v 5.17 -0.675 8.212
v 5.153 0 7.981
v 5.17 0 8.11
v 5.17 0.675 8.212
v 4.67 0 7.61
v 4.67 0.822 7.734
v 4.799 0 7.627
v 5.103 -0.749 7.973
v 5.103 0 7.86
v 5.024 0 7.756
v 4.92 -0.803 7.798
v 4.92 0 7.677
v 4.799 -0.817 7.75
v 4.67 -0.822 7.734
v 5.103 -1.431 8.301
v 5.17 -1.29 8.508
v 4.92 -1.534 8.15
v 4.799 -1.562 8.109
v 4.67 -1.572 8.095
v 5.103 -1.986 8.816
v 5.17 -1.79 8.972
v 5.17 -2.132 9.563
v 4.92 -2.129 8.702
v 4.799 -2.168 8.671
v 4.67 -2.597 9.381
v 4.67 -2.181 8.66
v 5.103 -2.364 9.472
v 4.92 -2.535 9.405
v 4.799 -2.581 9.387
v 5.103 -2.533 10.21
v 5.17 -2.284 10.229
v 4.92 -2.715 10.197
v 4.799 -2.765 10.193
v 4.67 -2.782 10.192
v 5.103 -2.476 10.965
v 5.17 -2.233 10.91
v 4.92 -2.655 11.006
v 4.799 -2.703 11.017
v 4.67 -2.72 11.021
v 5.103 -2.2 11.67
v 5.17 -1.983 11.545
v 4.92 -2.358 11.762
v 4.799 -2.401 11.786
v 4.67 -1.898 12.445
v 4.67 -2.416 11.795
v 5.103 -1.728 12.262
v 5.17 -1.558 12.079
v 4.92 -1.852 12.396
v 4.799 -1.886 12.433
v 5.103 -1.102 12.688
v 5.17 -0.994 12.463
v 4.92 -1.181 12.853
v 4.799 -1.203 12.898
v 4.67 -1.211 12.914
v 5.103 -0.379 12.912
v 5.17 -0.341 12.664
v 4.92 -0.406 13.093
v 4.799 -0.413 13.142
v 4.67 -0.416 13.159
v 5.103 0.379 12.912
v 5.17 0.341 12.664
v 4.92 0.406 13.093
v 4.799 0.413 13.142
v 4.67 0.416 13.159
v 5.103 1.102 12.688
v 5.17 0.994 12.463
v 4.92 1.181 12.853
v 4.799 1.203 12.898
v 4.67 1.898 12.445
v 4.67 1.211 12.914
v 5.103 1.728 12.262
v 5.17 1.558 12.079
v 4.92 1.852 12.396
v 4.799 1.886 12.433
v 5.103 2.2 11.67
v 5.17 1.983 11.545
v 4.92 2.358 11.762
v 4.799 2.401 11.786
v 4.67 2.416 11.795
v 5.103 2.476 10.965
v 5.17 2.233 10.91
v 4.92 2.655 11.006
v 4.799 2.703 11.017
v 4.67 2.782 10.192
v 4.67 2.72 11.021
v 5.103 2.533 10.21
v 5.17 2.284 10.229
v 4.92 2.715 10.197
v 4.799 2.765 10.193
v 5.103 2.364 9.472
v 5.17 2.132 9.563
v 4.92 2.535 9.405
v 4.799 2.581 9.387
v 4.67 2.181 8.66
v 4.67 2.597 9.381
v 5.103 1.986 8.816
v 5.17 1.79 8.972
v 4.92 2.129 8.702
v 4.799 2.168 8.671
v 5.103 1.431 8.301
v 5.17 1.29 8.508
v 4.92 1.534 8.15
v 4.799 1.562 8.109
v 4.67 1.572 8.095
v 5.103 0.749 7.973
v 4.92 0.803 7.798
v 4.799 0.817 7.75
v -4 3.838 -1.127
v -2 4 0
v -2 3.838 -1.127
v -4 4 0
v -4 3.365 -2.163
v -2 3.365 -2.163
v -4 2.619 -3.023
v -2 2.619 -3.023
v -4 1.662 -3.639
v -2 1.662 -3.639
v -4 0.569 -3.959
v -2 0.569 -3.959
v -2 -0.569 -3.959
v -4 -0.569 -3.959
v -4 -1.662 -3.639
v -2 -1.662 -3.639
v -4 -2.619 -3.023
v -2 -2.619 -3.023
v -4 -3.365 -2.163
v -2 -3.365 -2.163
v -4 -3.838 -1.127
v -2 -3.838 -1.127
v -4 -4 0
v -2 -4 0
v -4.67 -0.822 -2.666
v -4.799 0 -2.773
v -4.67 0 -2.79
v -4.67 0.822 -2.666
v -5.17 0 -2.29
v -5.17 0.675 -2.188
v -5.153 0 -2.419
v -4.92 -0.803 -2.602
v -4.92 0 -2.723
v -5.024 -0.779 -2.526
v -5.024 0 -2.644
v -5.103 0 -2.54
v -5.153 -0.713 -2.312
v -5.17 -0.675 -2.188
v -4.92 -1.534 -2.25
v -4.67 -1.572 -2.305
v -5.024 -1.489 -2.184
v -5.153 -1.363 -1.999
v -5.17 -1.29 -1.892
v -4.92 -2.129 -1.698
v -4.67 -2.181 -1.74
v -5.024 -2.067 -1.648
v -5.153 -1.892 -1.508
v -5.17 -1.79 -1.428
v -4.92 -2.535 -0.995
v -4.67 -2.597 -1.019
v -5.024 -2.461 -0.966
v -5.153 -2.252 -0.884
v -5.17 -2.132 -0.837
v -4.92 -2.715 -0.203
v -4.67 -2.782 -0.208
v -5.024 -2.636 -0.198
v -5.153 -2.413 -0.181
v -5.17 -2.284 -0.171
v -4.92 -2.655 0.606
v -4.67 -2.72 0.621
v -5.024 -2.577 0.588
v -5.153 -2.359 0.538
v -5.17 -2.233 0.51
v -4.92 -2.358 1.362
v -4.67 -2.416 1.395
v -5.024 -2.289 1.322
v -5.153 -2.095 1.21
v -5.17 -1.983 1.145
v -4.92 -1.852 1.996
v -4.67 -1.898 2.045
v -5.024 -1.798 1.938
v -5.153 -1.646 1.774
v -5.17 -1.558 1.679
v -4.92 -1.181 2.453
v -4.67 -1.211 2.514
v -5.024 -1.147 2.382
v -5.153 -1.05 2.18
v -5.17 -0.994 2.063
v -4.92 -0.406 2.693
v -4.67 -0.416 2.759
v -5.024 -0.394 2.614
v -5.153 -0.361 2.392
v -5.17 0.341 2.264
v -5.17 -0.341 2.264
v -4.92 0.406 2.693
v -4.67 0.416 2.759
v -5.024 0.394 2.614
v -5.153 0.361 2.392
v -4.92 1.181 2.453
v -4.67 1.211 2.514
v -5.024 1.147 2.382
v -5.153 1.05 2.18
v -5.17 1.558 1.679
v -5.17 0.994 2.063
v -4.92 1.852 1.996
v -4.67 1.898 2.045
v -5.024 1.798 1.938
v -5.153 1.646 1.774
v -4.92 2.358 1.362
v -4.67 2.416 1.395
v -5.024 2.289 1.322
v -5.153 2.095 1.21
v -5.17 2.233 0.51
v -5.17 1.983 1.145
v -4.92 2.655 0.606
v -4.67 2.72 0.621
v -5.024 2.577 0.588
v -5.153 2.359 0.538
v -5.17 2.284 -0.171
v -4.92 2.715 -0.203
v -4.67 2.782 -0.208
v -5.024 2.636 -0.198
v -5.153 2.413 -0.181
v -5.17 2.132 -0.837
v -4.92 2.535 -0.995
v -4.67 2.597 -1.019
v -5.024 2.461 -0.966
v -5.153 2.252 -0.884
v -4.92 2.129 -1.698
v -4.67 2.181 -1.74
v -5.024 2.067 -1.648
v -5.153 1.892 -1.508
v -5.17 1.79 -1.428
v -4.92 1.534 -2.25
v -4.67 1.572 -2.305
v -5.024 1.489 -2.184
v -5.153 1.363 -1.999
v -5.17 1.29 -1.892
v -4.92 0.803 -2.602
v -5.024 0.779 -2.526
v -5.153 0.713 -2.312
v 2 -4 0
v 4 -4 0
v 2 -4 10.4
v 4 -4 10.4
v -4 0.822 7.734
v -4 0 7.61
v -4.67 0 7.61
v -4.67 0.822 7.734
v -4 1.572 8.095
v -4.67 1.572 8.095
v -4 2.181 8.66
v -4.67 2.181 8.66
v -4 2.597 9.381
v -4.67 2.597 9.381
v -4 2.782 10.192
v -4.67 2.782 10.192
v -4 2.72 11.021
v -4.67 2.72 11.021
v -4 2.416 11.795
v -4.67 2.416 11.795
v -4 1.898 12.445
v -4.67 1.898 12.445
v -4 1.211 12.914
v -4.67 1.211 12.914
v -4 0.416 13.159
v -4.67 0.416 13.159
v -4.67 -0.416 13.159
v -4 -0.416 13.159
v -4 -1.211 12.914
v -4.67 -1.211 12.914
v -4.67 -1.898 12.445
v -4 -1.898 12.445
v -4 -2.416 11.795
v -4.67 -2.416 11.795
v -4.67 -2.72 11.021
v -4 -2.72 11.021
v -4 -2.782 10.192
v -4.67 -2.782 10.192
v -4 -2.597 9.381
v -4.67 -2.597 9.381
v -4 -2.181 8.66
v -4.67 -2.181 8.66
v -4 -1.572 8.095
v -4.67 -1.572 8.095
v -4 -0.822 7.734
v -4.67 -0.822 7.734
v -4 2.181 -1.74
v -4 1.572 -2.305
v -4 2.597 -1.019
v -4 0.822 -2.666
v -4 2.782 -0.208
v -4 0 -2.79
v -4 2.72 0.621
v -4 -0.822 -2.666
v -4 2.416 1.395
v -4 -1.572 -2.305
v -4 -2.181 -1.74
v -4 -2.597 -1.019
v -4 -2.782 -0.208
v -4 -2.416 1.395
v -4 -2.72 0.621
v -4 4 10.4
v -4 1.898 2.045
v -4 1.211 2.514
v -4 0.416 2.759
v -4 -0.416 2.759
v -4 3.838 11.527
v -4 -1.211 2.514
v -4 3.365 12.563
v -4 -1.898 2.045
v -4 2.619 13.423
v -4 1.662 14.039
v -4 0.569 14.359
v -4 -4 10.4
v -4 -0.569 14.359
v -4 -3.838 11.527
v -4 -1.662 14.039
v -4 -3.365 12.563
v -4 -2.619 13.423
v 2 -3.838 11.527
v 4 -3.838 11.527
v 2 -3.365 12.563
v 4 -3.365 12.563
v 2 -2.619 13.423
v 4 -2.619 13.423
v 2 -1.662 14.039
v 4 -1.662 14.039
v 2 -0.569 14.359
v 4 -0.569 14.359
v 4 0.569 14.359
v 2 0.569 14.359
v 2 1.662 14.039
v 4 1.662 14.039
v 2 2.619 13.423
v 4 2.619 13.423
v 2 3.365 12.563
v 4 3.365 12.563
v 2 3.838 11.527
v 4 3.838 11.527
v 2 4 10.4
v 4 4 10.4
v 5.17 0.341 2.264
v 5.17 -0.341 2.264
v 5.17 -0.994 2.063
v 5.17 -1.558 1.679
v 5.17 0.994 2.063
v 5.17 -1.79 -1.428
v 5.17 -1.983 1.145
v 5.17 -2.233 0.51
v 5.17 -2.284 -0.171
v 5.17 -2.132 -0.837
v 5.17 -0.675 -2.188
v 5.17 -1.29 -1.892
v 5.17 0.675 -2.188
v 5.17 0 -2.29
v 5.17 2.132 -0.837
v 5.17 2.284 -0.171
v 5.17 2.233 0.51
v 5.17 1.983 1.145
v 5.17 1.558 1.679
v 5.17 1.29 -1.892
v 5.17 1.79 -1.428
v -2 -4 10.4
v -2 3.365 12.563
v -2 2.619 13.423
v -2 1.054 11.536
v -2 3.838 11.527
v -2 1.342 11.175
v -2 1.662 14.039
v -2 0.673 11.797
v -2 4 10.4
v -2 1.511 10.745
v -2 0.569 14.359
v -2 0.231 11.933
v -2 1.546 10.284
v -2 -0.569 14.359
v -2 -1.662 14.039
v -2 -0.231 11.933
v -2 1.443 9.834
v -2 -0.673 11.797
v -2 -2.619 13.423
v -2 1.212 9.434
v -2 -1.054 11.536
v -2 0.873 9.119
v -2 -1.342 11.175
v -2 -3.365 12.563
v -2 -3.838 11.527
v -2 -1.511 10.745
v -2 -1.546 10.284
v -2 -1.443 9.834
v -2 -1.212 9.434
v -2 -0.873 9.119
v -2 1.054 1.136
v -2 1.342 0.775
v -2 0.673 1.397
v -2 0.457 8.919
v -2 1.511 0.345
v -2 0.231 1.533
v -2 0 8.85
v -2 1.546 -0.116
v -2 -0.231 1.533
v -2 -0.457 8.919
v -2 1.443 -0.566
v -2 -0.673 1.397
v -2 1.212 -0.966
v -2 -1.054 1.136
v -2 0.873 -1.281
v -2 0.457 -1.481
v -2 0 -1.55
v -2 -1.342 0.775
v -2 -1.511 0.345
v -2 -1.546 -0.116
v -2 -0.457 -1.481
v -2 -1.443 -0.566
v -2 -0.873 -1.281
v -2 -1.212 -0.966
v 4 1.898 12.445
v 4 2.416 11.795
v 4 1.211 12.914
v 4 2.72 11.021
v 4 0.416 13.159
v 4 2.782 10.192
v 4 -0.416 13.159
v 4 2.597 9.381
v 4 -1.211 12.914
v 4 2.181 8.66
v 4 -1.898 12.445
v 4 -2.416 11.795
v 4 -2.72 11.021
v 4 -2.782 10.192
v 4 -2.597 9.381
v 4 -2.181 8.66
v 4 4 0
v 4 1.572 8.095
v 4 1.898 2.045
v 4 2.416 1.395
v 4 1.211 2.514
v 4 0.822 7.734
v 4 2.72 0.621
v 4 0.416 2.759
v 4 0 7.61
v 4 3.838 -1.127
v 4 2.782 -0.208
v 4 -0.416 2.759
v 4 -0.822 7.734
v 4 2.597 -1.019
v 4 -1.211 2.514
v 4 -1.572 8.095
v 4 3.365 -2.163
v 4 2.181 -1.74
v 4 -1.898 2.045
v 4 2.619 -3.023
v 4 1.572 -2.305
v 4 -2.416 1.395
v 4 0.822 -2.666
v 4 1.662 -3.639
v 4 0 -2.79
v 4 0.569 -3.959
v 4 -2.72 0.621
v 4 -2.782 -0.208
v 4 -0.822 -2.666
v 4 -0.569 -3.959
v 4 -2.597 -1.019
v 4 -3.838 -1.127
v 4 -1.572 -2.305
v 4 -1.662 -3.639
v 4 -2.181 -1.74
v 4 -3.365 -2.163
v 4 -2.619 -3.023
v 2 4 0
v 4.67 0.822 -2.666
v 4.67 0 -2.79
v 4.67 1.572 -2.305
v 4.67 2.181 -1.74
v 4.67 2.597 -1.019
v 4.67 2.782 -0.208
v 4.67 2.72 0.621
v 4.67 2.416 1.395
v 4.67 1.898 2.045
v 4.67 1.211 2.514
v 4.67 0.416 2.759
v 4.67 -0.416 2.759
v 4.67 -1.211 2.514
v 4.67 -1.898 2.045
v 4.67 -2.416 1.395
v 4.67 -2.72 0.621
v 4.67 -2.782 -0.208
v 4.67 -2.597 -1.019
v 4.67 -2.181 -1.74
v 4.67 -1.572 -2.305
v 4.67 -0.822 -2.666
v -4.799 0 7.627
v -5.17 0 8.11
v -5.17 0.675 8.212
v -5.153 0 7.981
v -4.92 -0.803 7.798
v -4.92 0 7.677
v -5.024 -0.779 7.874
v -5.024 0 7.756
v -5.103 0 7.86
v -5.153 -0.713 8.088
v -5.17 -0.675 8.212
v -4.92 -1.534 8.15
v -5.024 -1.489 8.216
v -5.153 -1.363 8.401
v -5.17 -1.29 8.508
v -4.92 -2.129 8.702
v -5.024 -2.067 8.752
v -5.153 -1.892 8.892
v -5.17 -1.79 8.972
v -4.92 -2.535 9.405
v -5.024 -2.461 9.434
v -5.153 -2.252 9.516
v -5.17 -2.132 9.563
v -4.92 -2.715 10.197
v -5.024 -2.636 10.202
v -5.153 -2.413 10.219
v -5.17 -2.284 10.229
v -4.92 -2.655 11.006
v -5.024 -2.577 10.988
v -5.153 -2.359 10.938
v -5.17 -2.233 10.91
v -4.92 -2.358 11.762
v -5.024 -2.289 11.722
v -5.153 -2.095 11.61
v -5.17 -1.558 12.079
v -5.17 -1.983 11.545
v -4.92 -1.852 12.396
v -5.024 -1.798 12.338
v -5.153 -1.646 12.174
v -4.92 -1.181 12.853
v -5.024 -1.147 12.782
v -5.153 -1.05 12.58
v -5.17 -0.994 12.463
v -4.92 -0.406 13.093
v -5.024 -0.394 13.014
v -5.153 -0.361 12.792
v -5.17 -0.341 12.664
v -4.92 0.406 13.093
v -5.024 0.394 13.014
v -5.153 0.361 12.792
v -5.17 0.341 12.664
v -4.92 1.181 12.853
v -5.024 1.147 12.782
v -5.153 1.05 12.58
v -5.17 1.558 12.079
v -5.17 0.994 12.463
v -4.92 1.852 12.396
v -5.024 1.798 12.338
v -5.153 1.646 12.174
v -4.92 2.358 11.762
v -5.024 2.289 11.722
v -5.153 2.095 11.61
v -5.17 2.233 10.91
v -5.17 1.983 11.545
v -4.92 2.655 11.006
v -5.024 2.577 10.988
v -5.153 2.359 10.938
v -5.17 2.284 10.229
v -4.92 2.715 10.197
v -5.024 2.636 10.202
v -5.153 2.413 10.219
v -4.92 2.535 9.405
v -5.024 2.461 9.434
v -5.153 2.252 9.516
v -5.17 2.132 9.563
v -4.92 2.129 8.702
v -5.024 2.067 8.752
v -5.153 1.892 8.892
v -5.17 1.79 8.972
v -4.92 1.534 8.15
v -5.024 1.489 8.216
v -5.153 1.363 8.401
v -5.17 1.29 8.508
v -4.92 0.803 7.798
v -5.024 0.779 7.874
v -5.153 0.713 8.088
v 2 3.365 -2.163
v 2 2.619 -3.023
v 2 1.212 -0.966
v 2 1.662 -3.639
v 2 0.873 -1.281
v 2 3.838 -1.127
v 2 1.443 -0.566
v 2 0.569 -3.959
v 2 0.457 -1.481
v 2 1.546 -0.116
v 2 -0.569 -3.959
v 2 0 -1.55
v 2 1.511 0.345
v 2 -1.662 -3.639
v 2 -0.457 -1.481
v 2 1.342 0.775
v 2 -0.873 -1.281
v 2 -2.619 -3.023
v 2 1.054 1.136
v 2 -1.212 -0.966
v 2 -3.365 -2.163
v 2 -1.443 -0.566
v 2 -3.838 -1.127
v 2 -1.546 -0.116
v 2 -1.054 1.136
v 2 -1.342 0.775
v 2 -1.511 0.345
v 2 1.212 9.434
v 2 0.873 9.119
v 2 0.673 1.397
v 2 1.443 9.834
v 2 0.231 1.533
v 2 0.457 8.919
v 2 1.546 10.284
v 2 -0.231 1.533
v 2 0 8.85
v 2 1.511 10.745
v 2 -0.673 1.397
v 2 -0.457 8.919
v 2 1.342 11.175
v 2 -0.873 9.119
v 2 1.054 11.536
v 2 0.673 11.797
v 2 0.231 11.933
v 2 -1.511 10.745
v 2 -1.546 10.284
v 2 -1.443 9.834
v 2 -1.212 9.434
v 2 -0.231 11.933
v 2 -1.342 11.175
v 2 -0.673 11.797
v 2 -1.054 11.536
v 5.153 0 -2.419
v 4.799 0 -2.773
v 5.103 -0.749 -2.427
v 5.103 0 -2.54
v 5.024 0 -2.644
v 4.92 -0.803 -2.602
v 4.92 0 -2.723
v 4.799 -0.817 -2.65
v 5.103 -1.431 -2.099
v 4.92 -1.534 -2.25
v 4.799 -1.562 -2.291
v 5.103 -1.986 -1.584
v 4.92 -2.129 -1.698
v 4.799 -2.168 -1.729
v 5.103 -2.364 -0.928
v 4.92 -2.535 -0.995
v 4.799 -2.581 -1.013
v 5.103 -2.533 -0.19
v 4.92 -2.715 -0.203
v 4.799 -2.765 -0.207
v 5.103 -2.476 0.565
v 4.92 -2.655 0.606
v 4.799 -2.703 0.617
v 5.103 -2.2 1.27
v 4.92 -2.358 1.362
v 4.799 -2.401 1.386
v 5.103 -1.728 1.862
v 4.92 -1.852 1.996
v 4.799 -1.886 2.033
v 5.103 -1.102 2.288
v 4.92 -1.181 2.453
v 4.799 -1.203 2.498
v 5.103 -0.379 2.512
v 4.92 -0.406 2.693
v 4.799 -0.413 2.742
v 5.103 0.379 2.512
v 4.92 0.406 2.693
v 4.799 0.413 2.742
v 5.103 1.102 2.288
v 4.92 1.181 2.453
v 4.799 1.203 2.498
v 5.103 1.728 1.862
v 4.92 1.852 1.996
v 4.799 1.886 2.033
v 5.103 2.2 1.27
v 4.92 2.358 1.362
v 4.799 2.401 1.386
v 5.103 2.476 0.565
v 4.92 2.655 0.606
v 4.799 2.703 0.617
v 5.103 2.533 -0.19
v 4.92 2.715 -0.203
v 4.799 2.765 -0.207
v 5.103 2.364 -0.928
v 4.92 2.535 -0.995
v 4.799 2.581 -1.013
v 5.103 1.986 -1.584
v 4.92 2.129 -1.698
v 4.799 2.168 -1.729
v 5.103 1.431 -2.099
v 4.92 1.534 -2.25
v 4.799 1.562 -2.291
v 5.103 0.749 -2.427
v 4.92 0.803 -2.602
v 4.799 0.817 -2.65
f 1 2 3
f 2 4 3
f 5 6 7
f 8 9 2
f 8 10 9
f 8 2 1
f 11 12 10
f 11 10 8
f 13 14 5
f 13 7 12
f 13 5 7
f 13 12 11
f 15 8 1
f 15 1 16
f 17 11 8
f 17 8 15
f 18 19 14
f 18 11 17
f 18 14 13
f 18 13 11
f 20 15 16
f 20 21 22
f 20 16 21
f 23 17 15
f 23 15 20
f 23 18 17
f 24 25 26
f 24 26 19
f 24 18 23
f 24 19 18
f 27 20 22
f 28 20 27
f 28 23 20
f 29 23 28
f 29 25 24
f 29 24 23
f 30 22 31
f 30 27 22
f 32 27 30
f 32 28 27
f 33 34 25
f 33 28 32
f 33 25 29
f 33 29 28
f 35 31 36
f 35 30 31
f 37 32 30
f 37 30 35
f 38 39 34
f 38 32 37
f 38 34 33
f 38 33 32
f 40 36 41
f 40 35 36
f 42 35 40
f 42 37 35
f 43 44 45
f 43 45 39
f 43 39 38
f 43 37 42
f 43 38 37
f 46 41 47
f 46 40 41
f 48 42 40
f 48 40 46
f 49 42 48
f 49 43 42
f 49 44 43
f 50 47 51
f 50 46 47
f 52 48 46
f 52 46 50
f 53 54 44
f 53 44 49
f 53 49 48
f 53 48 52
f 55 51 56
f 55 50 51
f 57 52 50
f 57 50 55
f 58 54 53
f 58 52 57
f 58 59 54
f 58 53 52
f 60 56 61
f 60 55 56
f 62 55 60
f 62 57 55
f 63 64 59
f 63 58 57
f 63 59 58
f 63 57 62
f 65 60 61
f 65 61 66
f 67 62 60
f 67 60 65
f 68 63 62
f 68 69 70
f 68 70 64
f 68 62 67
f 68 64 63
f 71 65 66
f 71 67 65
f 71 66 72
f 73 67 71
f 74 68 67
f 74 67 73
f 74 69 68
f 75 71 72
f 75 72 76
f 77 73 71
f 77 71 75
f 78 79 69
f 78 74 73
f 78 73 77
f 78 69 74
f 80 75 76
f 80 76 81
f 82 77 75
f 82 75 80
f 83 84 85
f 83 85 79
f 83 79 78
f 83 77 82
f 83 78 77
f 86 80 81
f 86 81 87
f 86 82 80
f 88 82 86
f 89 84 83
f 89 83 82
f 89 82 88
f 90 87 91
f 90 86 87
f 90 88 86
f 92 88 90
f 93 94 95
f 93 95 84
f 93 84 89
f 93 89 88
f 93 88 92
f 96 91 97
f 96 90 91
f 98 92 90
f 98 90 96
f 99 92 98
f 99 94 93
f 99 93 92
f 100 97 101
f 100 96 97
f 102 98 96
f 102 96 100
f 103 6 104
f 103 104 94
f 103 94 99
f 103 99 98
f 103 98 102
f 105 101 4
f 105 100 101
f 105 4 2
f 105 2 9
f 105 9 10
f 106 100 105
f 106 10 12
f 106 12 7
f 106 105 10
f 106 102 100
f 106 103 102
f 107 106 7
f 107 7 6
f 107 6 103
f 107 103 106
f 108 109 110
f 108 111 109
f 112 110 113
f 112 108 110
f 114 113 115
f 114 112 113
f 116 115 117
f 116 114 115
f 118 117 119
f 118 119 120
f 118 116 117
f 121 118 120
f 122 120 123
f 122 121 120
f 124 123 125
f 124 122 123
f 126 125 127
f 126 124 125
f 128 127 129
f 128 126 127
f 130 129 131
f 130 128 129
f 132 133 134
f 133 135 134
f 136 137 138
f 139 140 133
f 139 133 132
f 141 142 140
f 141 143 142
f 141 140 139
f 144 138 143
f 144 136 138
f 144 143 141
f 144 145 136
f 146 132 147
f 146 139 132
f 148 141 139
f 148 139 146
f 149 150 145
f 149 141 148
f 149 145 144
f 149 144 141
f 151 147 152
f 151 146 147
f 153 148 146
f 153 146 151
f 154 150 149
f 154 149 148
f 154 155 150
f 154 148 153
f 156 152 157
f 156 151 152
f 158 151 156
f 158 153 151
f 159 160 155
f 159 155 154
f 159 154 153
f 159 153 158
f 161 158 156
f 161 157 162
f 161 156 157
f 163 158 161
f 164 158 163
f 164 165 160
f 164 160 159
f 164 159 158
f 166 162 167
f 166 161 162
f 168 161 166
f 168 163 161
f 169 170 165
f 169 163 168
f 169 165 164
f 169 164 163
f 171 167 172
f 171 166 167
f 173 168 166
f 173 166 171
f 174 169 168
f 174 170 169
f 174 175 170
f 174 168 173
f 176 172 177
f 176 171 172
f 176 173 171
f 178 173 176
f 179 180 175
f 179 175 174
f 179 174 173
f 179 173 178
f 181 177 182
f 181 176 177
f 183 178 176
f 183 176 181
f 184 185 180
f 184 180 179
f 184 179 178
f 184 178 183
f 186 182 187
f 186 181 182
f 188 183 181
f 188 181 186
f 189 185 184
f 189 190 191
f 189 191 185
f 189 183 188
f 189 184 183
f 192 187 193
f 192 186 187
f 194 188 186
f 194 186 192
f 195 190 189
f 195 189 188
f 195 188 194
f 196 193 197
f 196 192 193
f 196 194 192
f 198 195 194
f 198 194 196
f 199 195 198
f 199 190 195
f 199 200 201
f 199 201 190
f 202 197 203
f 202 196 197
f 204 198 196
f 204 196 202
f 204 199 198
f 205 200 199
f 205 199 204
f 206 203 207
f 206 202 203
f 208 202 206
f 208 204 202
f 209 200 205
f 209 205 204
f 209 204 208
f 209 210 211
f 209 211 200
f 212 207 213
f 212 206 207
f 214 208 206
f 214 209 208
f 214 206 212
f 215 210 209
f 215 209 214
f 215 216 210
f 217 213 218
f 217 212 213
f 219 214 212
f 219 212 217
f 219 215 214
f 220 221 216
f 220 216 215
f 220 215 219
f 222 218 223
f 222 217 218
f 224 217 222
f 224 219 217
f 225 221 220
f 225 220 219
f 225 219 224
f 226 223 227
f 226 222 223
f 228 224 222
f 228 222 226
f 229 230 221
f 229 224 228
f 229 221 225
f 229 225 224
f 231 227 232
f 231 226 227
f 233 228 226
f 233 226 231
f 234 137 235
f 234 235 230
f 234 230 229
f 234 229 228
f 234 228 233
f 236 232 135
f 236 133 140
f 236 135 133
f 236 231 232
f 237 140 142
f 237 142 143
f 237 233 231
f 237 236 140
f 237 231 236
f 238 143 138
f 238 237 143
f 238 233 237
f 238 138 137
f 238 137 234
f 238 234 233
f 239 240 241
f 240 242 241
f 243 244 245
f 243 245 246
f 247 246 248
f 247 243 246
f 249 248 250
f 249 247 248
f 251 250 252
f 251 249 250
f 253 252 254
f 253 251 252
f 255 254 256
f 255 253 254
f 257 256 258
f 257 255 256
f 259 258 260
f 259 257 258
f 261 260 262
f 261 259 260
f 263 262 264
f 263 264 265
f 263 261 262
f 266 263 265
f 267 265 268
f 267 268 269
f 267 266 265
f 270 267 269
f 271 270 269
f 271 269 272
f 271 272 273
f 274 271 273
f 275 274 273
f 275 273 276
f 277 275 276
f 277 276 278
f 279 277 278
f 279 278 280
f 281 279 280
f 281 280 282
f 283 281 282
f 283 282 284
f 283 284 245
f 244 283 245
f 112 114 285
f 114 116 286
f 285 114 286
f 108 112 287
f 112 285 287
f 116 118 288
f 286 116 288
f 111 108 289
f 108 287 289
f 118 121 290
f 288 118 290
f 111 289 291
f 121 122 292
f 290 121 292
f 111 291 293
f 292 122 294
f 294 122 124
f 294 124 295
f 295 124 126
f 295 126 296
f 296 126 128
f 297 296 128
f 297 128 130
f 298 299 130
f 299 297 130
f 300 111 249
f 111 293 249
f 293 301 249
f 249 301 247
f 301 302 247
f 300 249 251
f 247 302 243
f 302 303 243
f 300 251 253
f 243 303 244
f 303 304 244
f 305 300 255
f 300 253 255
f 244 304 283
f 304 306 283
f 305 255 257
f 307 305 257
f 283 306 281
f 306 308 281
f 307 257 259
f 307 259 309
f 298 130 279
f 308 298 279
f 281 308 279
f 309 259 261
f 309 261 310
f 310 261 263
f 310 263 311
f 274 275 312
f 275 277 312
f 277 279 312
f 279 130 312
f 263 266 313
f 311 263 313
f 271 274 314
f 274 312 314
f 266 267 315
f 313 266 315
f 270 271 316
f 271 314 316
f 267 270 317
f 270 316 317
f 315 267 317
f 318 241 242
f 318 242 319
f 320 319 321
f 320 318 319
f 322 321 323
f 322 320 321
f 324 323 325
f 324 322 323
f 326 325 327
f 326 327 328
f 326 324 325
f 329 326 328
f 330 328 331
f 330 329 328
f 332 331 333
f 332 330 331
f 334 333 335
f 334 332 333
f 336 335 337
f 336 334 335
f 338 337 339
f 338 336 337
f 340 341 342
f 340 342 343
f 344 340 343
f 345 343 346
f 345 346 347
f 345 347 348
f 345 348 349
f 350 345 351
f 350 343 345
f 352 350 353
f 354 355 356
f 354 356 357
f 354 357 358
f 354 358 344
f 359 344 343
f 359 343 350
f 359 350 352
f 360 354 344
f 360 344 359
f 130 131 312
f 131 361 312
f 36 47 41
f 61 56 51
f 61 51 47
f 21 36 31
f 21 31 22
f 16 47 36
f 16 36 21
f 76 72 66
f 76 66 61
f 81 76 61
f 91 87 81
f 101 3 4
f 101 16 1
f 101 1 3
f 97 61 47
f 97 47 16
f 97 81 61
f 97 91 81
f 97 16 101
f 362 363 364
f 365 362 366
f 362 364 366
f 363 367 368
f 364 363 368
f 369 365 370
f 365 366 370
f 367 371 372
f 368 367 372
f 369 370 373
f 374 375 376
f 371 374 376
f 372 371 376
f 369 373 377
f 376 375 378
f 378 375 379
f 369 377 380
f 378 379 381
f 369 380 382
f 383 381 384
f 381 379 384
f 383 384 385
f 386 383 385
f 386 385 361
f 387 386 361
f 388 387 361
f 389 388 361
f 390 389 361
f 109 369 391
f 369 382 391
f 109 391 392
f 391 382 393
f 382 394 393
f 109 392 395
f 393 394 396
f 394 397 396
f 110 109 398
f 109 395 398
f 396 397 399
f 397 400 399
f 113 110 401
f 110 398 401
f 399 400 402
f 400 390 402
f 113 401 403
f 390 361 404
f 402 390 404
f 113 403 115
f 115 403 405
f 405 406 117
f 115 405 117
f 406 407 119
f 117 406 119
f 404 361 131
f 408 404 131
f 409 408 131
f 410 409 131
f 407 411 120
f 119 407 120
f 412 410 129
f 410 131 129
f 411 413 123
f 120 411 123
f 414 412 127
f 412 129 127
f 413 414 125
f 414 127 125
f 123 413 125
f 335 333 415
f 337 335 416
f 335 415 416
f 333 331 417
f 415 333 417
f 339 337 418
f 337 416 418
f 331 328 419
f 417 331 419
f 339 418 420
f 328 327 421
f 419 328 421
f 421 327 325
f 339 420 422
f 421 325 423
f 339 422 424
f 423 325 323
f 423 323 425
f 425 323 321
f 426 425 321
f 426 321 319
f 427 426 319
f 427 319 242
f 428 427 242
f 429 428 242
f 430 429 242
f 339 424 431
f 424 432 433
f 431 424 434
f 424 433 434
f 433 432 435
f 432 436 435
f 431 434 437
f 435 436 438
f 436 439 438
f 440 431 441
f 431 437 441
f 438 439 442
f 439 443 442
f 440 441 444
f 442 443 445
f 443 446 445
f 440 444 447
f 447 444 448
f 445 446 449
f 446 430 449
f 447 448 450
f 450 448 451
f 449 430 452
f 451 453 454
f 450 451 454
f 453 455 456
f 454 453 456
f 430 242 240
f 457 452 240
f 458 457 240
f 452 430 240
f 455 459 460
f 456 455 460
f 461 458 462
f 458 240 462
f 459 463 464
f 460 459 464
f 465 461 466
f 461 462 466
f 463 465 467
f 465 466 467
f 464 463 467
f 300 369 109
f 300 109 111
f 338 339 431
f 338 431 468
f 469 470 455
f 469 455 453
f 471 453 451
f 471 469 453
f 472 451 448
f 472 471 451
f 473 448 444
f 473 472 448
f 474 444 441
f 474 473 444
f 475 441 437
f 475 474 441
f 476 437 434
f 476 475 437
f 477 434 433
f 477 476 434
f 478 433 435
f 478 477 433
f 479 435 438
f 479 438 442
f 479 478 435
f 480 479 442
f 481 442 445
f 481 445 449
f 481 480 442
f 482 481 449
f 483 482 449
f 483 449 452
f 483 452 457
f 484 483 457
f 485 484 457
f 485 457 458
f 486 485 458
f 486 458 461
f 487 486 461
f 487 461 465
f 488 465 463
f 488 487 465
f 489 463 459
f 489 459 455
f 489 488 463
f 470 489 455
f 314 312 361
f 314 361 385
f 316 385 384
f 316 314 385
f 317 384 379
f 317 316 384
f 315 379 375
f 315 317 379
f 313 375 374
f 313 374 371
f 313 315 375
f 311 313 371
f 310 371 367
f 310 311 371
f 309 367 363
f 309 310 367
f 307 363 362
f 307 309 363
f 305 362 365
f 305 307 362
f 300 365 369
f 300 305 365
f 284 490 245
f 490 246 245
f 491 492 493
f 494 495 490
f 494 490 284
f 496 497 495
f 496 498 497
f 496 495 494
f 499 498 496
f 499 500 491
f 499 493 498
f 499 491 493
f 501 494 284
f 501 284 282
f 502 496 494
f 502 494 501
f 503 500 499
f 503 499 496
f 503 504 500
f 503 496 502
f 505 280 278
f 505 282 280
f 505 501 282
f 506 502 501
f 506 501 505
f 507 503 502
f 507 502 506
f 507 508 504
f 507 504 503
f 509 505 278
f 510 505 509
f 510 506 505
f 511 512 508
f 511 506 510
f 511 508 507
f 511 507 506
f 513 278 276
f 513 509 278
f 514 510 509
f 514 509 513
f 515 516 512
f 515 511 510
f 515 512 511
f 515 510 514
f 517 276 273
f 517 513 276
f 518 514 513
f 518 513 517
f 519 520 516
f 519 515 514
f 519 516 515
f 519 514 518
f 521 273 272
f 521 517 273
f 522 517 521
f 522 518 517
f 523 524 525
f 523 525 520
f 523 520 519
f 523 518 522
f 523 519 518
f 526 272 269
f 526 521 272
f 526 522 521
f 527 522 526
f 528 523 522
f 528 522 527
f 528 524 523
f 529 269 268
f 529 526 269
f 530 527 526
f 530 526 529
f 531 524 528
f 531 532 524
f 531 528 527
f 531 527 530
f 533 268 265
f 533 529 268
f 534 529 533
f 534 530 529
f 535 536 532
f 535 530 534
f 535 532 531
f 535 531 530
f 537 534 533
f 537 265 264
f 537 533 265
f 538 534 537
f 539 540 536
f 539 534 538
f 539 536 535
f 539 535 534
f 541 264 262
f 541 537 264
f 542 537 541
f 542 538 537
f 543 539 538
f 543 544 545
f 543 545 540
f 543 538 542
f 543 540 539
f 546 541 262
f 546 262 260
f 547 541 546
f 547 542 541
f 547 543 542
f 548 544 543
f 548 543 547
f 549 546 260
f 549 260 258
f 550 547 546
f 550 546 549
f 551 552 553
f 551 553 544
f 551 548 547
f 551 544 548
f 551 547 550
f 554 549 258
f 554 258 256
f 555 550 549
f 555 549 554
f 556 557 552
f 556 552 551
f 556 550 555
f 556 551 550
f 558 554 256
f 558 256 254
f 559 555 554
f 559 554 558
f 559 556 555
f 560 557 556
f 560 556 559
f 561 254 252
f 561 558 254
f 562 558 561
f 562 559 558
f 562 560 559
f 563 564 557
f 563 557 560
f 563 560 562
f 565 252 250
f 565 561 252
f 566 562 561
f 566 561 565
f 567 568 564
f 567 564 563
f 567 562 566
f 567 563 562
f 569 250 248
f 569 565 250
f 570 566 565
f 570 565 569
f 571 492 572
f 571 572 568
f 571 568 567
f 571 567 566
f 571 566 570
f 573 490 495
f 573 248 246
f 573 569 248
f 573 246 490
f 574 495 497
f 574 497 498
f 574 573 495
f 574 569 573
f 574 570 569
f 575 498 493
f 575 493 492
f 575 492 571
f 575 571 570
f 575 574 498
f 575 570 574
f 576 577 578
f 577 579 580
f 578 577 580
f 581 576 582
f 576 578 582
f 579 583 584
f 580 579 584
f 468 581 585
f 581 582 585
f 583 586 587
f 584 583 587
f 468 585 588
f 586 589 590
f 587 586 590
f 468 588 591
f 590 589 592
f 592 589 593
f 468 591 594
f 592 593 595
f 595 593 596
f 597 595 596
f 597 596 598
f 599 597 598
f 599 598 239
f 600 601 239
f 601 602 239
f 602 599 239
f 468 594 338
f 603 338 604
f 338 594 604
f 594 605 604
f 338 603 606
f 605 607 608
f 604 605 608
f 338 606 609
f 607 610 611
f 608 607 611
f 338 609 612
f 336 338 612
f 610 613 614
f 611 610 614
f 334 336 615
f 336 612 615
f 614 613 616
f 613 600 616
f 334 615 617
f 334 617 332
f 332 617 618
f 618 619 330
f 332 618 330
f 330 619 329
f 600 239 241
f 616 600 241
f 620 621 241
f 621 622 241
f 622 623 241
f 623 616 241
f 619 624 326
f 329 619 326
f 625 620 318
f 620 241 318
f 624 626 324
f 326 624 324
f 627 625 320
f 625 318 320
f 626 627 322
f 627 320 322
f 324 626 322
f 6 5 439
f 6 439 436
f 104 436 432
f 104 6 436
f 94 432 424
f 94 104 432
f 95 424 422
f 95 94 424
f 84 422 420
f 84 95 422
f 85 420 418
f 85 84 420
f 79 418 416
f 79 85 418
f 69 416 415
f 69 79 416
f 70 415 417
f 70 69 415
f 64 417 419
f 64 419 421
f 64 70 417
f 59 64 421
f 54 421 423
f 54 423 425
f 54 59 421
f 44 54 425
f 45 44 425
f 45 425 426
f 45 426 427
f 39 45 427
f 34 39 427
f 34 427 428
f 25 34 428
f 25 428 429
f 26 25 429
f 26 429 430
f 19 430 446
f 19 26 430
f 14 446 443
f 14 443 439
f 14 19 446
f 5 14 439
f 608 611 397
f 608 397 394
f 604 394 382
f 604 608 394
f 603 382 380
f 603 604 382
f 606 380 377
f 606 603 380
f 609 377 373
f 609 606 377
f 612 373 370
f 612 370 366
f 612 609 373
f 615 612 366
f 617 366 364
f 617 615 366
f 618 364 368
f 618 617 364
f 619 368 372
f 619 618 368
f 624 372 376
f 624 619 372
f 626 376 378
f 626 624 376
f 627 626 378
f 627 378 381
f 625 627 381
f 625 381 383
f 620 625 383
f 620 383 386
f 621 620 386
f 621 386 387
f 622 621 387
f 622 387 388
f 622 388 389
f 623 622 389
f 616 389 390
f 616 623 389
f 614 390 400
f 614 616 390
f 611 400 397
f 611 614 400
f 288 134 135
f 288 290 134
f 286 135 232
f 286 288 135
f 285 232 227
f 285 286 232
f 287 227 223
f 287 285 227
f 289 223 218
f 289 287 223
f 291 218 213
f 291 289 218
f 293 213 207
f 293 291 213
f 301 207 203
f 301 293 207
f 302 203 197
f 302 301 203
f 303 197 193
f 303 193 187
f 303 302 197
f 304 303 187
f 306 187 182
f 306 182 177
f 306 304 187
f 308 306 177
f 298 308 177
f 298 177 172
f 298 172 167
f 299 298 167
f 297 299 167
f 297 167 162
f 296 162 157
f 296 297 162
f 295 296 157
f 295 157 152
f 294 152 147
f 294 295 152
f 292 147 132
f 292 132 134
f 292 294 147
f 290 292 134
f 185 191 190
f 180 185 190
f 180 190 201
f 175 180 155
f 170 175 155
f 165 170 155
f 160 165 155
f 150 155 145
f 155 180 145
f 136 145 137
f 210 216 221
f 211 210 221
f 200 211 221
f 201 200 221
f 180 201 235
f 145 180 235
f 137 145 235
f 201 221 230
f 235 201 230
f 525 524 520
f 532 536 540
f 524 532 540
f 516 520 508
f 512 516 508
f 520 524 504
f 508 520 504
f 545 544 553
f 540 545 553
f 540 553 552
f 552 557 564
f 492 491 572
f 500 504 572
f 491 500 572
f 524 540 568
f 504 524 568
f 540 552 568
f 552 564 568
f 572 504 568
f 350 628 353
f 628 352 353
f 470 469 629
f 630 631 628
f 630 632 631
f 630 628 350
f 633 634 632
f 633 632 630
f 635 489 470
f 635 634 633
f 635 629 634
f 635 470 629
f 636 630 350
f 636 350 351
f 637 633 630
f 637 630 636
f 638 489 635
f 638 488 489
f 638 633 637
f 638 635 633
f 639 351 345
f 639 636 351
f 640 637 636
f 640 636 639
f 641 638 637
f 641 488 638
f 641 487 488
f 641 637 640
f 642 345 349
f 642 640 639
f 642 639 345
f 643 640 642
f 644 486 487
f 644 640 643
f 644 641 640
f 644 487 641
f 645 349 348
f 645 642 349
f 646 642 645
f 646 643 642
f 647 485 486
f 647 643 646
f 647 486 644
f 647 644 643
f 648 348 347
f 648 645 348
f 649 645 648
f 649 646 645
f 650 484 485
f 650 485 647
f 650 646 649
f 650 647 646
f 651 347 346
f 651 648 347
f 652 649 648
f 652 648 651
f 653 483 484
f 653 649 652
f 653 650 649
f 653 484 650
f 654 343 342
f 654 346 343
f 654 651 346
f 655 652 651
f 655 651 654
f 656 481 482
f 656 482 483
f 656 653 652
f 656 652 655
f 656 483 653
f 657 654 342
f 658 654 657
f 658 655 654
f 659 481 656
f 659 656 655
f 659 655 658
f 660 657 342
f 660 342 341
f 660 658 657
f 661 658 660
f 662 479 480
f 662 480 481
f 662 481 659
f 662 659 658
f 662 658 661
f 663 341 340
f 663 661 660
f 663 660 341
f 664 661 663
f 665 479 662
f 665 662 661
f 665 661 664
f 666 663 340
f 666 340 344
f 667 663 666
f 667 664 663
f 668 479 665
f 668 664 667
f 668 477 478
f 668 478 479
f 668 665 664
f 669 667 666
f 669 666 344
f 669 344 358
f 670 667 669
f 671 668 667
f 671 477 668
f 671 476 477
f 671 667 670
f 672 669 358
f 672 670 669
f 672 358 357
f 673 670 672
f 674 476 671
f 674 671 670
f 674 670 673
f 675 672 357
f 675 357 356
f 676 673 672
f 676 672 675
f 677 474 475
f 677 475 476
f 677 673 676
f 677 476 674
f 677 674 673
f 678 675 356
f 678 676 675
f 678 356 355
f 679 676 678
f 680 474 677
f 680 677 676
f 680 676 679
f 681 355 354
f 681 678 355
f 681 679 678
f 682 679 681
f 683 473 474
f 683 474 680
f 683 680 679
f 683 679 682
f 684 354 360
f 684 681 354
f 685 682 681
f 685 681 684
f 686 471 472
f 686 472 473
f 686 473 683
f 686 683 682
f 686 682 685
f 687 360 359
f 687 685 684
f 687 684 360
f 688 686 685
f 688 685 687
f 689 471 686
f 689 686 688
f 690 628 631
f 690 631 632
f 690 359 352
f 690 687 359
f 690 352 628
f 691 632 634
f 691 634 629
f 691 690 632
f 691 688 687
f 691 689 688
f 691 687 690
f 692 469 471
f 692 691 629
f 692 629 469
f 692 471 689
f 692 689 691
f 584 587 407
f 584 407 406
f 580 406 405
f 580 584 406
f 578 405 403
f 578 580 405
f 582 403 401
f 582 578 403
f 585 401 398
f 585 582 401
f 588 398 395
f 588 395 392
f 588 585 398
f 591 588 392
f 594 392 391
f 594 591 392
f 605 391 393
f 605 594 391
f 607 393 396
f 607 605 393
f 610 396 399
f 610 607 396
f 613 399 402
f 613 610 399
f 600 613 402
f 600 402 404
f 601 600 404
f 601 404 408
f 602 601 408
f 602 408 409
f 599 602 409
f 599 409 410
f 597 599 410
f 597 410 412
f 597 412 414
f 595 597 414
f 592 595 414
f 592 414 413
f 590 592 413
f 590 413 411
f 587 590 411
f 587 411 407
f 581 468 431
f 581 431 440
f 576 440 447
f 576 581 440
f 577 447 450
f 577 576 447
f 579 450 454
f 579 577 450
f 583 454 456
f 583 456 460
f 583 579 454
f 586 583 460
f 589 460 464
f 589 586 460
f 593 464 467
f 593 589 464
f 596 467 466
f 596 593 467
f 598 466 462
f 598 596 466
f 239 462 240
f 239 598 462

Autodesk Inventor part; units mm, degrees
sketch "Skizze_1" plane through (0, 0, 0) normal (0, 1, 0) x (-1, 0, 0)
  line L0 (4, 14.4) -> (2, 14.4)
  line L1 (2, 14.4) -> (2, -4)
  line L2 (2, -4) -> (4, -4)
  line L3 (4, -4) -> (4, 14.4)
extrude "Extrusion1" add sketch "Skizze_1" along normal mid plane 8
sketch "Skizze_2" plane through (0, 0, 0) normal (0, 1, 0) x (-1, 0, 0)
  line L0 (-5.17, 0) -> (0, 0)
  line L1 (5.17, 0) -> (5.17, -2.29)
  arc A0 (4.67, -2.79) -> (5.17, -2.29) centre (4.67, -2.29) ccw
  line L2 (4.67, -2.79) -> (4, -2.79)
  line L3 (4, -2.79) -> (4, -1.55)
  line L4 (4, -1.55) -> (-4, -1.55)
  line L5 (-4, -1.55) -> (-4, -2.79)
  line L6 (-4, -2.79) -> (-4.67, -2.79)
  arc A1 (-5.17, -2.29) -> (-4.67, -2.79) centre (-4.67, -2.29) ccw
  line L7 (-5.17, -2.29) -> (-5.17, 0)
  line L8 (-5.17, 0) -> (5.17, 0)
revolve "Revolution1" add sketch "Skizze_2" angle 360 about axis through (5.17, 0, 0) along (1, 0, 0)
sketch "Skizze_3" plane through (0, 0, 0) normal (0, 1, 0) x (-1, 0, 0)
  line L0 (-5.17, 10.4) -> (0, 10.4)
  line L1 (5.17, 10.4) -> (5.17, 8.11)
  arc A0 (4.67, 7.61) -> (5.17, 8.11) centre (4.67, 8.11) ccw
  line L2 (4.67, 7.61) -> (4, 7.61)
  line L3 (4, 7.61) -> (4, 8.85)
  line L4 (4, 8.85) -> (-4, 8.85)
  line L5 (-4, 8.85) -> (-4, 7.61)
  line L6 (-4, 7.61) -> (-4.67, 7.61)
  arc A1 (-5.17, 8.11) -> (-4.67, 7.61) centre (-4.67, 8.11) ccw
  line L7 (-5.17, 8.11) -> (-5.17, 10.4)
  line L8 (-5.17, 10.4) -> (5.17, 10.4)
revolve "Revolution2" add sketch "Skizze_3" angle 360 about axis through (5.17, 0, 10.4) along (1, 0, 0)
sketch "Skizze_4" plane through (0, 0, 0) normal (0, 1, 0) x (-1, 0, 0)
  line L0 (-2, 14.4) -> (-4, 14.4)
  line L1 (-4, 14.4) -> (-4, -4)
  line L2 (-4, -4) -> (-2, -4)
  line L3 (-2, -4) -> (-2, 14.4)
extrude "Extrusion2" add sketch "Skizze_4" along normal mid plane 8
sketch "Skizze_5" plane through (0, 0, 0) normal (1, 0, 0) x (0, 1, 0)
  line L0 (-20, 30) -> (-20, -40)
  line L1 (-20, -40) -> (10, -40)
  line L2 (10, -40) -> (10, 30)
  line L3 (10, 30) -> (-20, 30)
  arc A0 (4, 10.4) -> (-4, 10.4) centre (0, 10.4) ccw
  line L4 (-4, 10.4) -> (-4, 0)
  arc A1 (-4, 0) -> (4, 0) centre (0, 0) ccw
  line L5 (4, 0) -> (4, 10.4)
extrude "Extrusion3" cut sketch "Skizze_5" along normal mid plane 20
ref_plane "ZS1_XY" through (0, 0, 0) normal (1, 0, 0) x (0, 0, -1)
ref_plane "ZS1_YZ" through (0, 0, 0) normal (0, 0, -1) x (0, 1, 0)
ref_plane "ZS1_ZX" through (0, 0, 0) normal (0, 1, 0) x (1, 0, 0)
ref_plane "ZS2_XY" through (0, 0, 10.4) normal (1, 0, 0) x (0, 0, -1)
ref_plane "ZS2_YZ" through (0, 0, 10.4) normal (0, 0, -1) x (0, 1, 0)
ref_plane "ZS2_ZX" through (0, 0, 10.4) normal (0, 1, 0) x (1, 0, 0)
properties part number "305103-M-KOMP"
